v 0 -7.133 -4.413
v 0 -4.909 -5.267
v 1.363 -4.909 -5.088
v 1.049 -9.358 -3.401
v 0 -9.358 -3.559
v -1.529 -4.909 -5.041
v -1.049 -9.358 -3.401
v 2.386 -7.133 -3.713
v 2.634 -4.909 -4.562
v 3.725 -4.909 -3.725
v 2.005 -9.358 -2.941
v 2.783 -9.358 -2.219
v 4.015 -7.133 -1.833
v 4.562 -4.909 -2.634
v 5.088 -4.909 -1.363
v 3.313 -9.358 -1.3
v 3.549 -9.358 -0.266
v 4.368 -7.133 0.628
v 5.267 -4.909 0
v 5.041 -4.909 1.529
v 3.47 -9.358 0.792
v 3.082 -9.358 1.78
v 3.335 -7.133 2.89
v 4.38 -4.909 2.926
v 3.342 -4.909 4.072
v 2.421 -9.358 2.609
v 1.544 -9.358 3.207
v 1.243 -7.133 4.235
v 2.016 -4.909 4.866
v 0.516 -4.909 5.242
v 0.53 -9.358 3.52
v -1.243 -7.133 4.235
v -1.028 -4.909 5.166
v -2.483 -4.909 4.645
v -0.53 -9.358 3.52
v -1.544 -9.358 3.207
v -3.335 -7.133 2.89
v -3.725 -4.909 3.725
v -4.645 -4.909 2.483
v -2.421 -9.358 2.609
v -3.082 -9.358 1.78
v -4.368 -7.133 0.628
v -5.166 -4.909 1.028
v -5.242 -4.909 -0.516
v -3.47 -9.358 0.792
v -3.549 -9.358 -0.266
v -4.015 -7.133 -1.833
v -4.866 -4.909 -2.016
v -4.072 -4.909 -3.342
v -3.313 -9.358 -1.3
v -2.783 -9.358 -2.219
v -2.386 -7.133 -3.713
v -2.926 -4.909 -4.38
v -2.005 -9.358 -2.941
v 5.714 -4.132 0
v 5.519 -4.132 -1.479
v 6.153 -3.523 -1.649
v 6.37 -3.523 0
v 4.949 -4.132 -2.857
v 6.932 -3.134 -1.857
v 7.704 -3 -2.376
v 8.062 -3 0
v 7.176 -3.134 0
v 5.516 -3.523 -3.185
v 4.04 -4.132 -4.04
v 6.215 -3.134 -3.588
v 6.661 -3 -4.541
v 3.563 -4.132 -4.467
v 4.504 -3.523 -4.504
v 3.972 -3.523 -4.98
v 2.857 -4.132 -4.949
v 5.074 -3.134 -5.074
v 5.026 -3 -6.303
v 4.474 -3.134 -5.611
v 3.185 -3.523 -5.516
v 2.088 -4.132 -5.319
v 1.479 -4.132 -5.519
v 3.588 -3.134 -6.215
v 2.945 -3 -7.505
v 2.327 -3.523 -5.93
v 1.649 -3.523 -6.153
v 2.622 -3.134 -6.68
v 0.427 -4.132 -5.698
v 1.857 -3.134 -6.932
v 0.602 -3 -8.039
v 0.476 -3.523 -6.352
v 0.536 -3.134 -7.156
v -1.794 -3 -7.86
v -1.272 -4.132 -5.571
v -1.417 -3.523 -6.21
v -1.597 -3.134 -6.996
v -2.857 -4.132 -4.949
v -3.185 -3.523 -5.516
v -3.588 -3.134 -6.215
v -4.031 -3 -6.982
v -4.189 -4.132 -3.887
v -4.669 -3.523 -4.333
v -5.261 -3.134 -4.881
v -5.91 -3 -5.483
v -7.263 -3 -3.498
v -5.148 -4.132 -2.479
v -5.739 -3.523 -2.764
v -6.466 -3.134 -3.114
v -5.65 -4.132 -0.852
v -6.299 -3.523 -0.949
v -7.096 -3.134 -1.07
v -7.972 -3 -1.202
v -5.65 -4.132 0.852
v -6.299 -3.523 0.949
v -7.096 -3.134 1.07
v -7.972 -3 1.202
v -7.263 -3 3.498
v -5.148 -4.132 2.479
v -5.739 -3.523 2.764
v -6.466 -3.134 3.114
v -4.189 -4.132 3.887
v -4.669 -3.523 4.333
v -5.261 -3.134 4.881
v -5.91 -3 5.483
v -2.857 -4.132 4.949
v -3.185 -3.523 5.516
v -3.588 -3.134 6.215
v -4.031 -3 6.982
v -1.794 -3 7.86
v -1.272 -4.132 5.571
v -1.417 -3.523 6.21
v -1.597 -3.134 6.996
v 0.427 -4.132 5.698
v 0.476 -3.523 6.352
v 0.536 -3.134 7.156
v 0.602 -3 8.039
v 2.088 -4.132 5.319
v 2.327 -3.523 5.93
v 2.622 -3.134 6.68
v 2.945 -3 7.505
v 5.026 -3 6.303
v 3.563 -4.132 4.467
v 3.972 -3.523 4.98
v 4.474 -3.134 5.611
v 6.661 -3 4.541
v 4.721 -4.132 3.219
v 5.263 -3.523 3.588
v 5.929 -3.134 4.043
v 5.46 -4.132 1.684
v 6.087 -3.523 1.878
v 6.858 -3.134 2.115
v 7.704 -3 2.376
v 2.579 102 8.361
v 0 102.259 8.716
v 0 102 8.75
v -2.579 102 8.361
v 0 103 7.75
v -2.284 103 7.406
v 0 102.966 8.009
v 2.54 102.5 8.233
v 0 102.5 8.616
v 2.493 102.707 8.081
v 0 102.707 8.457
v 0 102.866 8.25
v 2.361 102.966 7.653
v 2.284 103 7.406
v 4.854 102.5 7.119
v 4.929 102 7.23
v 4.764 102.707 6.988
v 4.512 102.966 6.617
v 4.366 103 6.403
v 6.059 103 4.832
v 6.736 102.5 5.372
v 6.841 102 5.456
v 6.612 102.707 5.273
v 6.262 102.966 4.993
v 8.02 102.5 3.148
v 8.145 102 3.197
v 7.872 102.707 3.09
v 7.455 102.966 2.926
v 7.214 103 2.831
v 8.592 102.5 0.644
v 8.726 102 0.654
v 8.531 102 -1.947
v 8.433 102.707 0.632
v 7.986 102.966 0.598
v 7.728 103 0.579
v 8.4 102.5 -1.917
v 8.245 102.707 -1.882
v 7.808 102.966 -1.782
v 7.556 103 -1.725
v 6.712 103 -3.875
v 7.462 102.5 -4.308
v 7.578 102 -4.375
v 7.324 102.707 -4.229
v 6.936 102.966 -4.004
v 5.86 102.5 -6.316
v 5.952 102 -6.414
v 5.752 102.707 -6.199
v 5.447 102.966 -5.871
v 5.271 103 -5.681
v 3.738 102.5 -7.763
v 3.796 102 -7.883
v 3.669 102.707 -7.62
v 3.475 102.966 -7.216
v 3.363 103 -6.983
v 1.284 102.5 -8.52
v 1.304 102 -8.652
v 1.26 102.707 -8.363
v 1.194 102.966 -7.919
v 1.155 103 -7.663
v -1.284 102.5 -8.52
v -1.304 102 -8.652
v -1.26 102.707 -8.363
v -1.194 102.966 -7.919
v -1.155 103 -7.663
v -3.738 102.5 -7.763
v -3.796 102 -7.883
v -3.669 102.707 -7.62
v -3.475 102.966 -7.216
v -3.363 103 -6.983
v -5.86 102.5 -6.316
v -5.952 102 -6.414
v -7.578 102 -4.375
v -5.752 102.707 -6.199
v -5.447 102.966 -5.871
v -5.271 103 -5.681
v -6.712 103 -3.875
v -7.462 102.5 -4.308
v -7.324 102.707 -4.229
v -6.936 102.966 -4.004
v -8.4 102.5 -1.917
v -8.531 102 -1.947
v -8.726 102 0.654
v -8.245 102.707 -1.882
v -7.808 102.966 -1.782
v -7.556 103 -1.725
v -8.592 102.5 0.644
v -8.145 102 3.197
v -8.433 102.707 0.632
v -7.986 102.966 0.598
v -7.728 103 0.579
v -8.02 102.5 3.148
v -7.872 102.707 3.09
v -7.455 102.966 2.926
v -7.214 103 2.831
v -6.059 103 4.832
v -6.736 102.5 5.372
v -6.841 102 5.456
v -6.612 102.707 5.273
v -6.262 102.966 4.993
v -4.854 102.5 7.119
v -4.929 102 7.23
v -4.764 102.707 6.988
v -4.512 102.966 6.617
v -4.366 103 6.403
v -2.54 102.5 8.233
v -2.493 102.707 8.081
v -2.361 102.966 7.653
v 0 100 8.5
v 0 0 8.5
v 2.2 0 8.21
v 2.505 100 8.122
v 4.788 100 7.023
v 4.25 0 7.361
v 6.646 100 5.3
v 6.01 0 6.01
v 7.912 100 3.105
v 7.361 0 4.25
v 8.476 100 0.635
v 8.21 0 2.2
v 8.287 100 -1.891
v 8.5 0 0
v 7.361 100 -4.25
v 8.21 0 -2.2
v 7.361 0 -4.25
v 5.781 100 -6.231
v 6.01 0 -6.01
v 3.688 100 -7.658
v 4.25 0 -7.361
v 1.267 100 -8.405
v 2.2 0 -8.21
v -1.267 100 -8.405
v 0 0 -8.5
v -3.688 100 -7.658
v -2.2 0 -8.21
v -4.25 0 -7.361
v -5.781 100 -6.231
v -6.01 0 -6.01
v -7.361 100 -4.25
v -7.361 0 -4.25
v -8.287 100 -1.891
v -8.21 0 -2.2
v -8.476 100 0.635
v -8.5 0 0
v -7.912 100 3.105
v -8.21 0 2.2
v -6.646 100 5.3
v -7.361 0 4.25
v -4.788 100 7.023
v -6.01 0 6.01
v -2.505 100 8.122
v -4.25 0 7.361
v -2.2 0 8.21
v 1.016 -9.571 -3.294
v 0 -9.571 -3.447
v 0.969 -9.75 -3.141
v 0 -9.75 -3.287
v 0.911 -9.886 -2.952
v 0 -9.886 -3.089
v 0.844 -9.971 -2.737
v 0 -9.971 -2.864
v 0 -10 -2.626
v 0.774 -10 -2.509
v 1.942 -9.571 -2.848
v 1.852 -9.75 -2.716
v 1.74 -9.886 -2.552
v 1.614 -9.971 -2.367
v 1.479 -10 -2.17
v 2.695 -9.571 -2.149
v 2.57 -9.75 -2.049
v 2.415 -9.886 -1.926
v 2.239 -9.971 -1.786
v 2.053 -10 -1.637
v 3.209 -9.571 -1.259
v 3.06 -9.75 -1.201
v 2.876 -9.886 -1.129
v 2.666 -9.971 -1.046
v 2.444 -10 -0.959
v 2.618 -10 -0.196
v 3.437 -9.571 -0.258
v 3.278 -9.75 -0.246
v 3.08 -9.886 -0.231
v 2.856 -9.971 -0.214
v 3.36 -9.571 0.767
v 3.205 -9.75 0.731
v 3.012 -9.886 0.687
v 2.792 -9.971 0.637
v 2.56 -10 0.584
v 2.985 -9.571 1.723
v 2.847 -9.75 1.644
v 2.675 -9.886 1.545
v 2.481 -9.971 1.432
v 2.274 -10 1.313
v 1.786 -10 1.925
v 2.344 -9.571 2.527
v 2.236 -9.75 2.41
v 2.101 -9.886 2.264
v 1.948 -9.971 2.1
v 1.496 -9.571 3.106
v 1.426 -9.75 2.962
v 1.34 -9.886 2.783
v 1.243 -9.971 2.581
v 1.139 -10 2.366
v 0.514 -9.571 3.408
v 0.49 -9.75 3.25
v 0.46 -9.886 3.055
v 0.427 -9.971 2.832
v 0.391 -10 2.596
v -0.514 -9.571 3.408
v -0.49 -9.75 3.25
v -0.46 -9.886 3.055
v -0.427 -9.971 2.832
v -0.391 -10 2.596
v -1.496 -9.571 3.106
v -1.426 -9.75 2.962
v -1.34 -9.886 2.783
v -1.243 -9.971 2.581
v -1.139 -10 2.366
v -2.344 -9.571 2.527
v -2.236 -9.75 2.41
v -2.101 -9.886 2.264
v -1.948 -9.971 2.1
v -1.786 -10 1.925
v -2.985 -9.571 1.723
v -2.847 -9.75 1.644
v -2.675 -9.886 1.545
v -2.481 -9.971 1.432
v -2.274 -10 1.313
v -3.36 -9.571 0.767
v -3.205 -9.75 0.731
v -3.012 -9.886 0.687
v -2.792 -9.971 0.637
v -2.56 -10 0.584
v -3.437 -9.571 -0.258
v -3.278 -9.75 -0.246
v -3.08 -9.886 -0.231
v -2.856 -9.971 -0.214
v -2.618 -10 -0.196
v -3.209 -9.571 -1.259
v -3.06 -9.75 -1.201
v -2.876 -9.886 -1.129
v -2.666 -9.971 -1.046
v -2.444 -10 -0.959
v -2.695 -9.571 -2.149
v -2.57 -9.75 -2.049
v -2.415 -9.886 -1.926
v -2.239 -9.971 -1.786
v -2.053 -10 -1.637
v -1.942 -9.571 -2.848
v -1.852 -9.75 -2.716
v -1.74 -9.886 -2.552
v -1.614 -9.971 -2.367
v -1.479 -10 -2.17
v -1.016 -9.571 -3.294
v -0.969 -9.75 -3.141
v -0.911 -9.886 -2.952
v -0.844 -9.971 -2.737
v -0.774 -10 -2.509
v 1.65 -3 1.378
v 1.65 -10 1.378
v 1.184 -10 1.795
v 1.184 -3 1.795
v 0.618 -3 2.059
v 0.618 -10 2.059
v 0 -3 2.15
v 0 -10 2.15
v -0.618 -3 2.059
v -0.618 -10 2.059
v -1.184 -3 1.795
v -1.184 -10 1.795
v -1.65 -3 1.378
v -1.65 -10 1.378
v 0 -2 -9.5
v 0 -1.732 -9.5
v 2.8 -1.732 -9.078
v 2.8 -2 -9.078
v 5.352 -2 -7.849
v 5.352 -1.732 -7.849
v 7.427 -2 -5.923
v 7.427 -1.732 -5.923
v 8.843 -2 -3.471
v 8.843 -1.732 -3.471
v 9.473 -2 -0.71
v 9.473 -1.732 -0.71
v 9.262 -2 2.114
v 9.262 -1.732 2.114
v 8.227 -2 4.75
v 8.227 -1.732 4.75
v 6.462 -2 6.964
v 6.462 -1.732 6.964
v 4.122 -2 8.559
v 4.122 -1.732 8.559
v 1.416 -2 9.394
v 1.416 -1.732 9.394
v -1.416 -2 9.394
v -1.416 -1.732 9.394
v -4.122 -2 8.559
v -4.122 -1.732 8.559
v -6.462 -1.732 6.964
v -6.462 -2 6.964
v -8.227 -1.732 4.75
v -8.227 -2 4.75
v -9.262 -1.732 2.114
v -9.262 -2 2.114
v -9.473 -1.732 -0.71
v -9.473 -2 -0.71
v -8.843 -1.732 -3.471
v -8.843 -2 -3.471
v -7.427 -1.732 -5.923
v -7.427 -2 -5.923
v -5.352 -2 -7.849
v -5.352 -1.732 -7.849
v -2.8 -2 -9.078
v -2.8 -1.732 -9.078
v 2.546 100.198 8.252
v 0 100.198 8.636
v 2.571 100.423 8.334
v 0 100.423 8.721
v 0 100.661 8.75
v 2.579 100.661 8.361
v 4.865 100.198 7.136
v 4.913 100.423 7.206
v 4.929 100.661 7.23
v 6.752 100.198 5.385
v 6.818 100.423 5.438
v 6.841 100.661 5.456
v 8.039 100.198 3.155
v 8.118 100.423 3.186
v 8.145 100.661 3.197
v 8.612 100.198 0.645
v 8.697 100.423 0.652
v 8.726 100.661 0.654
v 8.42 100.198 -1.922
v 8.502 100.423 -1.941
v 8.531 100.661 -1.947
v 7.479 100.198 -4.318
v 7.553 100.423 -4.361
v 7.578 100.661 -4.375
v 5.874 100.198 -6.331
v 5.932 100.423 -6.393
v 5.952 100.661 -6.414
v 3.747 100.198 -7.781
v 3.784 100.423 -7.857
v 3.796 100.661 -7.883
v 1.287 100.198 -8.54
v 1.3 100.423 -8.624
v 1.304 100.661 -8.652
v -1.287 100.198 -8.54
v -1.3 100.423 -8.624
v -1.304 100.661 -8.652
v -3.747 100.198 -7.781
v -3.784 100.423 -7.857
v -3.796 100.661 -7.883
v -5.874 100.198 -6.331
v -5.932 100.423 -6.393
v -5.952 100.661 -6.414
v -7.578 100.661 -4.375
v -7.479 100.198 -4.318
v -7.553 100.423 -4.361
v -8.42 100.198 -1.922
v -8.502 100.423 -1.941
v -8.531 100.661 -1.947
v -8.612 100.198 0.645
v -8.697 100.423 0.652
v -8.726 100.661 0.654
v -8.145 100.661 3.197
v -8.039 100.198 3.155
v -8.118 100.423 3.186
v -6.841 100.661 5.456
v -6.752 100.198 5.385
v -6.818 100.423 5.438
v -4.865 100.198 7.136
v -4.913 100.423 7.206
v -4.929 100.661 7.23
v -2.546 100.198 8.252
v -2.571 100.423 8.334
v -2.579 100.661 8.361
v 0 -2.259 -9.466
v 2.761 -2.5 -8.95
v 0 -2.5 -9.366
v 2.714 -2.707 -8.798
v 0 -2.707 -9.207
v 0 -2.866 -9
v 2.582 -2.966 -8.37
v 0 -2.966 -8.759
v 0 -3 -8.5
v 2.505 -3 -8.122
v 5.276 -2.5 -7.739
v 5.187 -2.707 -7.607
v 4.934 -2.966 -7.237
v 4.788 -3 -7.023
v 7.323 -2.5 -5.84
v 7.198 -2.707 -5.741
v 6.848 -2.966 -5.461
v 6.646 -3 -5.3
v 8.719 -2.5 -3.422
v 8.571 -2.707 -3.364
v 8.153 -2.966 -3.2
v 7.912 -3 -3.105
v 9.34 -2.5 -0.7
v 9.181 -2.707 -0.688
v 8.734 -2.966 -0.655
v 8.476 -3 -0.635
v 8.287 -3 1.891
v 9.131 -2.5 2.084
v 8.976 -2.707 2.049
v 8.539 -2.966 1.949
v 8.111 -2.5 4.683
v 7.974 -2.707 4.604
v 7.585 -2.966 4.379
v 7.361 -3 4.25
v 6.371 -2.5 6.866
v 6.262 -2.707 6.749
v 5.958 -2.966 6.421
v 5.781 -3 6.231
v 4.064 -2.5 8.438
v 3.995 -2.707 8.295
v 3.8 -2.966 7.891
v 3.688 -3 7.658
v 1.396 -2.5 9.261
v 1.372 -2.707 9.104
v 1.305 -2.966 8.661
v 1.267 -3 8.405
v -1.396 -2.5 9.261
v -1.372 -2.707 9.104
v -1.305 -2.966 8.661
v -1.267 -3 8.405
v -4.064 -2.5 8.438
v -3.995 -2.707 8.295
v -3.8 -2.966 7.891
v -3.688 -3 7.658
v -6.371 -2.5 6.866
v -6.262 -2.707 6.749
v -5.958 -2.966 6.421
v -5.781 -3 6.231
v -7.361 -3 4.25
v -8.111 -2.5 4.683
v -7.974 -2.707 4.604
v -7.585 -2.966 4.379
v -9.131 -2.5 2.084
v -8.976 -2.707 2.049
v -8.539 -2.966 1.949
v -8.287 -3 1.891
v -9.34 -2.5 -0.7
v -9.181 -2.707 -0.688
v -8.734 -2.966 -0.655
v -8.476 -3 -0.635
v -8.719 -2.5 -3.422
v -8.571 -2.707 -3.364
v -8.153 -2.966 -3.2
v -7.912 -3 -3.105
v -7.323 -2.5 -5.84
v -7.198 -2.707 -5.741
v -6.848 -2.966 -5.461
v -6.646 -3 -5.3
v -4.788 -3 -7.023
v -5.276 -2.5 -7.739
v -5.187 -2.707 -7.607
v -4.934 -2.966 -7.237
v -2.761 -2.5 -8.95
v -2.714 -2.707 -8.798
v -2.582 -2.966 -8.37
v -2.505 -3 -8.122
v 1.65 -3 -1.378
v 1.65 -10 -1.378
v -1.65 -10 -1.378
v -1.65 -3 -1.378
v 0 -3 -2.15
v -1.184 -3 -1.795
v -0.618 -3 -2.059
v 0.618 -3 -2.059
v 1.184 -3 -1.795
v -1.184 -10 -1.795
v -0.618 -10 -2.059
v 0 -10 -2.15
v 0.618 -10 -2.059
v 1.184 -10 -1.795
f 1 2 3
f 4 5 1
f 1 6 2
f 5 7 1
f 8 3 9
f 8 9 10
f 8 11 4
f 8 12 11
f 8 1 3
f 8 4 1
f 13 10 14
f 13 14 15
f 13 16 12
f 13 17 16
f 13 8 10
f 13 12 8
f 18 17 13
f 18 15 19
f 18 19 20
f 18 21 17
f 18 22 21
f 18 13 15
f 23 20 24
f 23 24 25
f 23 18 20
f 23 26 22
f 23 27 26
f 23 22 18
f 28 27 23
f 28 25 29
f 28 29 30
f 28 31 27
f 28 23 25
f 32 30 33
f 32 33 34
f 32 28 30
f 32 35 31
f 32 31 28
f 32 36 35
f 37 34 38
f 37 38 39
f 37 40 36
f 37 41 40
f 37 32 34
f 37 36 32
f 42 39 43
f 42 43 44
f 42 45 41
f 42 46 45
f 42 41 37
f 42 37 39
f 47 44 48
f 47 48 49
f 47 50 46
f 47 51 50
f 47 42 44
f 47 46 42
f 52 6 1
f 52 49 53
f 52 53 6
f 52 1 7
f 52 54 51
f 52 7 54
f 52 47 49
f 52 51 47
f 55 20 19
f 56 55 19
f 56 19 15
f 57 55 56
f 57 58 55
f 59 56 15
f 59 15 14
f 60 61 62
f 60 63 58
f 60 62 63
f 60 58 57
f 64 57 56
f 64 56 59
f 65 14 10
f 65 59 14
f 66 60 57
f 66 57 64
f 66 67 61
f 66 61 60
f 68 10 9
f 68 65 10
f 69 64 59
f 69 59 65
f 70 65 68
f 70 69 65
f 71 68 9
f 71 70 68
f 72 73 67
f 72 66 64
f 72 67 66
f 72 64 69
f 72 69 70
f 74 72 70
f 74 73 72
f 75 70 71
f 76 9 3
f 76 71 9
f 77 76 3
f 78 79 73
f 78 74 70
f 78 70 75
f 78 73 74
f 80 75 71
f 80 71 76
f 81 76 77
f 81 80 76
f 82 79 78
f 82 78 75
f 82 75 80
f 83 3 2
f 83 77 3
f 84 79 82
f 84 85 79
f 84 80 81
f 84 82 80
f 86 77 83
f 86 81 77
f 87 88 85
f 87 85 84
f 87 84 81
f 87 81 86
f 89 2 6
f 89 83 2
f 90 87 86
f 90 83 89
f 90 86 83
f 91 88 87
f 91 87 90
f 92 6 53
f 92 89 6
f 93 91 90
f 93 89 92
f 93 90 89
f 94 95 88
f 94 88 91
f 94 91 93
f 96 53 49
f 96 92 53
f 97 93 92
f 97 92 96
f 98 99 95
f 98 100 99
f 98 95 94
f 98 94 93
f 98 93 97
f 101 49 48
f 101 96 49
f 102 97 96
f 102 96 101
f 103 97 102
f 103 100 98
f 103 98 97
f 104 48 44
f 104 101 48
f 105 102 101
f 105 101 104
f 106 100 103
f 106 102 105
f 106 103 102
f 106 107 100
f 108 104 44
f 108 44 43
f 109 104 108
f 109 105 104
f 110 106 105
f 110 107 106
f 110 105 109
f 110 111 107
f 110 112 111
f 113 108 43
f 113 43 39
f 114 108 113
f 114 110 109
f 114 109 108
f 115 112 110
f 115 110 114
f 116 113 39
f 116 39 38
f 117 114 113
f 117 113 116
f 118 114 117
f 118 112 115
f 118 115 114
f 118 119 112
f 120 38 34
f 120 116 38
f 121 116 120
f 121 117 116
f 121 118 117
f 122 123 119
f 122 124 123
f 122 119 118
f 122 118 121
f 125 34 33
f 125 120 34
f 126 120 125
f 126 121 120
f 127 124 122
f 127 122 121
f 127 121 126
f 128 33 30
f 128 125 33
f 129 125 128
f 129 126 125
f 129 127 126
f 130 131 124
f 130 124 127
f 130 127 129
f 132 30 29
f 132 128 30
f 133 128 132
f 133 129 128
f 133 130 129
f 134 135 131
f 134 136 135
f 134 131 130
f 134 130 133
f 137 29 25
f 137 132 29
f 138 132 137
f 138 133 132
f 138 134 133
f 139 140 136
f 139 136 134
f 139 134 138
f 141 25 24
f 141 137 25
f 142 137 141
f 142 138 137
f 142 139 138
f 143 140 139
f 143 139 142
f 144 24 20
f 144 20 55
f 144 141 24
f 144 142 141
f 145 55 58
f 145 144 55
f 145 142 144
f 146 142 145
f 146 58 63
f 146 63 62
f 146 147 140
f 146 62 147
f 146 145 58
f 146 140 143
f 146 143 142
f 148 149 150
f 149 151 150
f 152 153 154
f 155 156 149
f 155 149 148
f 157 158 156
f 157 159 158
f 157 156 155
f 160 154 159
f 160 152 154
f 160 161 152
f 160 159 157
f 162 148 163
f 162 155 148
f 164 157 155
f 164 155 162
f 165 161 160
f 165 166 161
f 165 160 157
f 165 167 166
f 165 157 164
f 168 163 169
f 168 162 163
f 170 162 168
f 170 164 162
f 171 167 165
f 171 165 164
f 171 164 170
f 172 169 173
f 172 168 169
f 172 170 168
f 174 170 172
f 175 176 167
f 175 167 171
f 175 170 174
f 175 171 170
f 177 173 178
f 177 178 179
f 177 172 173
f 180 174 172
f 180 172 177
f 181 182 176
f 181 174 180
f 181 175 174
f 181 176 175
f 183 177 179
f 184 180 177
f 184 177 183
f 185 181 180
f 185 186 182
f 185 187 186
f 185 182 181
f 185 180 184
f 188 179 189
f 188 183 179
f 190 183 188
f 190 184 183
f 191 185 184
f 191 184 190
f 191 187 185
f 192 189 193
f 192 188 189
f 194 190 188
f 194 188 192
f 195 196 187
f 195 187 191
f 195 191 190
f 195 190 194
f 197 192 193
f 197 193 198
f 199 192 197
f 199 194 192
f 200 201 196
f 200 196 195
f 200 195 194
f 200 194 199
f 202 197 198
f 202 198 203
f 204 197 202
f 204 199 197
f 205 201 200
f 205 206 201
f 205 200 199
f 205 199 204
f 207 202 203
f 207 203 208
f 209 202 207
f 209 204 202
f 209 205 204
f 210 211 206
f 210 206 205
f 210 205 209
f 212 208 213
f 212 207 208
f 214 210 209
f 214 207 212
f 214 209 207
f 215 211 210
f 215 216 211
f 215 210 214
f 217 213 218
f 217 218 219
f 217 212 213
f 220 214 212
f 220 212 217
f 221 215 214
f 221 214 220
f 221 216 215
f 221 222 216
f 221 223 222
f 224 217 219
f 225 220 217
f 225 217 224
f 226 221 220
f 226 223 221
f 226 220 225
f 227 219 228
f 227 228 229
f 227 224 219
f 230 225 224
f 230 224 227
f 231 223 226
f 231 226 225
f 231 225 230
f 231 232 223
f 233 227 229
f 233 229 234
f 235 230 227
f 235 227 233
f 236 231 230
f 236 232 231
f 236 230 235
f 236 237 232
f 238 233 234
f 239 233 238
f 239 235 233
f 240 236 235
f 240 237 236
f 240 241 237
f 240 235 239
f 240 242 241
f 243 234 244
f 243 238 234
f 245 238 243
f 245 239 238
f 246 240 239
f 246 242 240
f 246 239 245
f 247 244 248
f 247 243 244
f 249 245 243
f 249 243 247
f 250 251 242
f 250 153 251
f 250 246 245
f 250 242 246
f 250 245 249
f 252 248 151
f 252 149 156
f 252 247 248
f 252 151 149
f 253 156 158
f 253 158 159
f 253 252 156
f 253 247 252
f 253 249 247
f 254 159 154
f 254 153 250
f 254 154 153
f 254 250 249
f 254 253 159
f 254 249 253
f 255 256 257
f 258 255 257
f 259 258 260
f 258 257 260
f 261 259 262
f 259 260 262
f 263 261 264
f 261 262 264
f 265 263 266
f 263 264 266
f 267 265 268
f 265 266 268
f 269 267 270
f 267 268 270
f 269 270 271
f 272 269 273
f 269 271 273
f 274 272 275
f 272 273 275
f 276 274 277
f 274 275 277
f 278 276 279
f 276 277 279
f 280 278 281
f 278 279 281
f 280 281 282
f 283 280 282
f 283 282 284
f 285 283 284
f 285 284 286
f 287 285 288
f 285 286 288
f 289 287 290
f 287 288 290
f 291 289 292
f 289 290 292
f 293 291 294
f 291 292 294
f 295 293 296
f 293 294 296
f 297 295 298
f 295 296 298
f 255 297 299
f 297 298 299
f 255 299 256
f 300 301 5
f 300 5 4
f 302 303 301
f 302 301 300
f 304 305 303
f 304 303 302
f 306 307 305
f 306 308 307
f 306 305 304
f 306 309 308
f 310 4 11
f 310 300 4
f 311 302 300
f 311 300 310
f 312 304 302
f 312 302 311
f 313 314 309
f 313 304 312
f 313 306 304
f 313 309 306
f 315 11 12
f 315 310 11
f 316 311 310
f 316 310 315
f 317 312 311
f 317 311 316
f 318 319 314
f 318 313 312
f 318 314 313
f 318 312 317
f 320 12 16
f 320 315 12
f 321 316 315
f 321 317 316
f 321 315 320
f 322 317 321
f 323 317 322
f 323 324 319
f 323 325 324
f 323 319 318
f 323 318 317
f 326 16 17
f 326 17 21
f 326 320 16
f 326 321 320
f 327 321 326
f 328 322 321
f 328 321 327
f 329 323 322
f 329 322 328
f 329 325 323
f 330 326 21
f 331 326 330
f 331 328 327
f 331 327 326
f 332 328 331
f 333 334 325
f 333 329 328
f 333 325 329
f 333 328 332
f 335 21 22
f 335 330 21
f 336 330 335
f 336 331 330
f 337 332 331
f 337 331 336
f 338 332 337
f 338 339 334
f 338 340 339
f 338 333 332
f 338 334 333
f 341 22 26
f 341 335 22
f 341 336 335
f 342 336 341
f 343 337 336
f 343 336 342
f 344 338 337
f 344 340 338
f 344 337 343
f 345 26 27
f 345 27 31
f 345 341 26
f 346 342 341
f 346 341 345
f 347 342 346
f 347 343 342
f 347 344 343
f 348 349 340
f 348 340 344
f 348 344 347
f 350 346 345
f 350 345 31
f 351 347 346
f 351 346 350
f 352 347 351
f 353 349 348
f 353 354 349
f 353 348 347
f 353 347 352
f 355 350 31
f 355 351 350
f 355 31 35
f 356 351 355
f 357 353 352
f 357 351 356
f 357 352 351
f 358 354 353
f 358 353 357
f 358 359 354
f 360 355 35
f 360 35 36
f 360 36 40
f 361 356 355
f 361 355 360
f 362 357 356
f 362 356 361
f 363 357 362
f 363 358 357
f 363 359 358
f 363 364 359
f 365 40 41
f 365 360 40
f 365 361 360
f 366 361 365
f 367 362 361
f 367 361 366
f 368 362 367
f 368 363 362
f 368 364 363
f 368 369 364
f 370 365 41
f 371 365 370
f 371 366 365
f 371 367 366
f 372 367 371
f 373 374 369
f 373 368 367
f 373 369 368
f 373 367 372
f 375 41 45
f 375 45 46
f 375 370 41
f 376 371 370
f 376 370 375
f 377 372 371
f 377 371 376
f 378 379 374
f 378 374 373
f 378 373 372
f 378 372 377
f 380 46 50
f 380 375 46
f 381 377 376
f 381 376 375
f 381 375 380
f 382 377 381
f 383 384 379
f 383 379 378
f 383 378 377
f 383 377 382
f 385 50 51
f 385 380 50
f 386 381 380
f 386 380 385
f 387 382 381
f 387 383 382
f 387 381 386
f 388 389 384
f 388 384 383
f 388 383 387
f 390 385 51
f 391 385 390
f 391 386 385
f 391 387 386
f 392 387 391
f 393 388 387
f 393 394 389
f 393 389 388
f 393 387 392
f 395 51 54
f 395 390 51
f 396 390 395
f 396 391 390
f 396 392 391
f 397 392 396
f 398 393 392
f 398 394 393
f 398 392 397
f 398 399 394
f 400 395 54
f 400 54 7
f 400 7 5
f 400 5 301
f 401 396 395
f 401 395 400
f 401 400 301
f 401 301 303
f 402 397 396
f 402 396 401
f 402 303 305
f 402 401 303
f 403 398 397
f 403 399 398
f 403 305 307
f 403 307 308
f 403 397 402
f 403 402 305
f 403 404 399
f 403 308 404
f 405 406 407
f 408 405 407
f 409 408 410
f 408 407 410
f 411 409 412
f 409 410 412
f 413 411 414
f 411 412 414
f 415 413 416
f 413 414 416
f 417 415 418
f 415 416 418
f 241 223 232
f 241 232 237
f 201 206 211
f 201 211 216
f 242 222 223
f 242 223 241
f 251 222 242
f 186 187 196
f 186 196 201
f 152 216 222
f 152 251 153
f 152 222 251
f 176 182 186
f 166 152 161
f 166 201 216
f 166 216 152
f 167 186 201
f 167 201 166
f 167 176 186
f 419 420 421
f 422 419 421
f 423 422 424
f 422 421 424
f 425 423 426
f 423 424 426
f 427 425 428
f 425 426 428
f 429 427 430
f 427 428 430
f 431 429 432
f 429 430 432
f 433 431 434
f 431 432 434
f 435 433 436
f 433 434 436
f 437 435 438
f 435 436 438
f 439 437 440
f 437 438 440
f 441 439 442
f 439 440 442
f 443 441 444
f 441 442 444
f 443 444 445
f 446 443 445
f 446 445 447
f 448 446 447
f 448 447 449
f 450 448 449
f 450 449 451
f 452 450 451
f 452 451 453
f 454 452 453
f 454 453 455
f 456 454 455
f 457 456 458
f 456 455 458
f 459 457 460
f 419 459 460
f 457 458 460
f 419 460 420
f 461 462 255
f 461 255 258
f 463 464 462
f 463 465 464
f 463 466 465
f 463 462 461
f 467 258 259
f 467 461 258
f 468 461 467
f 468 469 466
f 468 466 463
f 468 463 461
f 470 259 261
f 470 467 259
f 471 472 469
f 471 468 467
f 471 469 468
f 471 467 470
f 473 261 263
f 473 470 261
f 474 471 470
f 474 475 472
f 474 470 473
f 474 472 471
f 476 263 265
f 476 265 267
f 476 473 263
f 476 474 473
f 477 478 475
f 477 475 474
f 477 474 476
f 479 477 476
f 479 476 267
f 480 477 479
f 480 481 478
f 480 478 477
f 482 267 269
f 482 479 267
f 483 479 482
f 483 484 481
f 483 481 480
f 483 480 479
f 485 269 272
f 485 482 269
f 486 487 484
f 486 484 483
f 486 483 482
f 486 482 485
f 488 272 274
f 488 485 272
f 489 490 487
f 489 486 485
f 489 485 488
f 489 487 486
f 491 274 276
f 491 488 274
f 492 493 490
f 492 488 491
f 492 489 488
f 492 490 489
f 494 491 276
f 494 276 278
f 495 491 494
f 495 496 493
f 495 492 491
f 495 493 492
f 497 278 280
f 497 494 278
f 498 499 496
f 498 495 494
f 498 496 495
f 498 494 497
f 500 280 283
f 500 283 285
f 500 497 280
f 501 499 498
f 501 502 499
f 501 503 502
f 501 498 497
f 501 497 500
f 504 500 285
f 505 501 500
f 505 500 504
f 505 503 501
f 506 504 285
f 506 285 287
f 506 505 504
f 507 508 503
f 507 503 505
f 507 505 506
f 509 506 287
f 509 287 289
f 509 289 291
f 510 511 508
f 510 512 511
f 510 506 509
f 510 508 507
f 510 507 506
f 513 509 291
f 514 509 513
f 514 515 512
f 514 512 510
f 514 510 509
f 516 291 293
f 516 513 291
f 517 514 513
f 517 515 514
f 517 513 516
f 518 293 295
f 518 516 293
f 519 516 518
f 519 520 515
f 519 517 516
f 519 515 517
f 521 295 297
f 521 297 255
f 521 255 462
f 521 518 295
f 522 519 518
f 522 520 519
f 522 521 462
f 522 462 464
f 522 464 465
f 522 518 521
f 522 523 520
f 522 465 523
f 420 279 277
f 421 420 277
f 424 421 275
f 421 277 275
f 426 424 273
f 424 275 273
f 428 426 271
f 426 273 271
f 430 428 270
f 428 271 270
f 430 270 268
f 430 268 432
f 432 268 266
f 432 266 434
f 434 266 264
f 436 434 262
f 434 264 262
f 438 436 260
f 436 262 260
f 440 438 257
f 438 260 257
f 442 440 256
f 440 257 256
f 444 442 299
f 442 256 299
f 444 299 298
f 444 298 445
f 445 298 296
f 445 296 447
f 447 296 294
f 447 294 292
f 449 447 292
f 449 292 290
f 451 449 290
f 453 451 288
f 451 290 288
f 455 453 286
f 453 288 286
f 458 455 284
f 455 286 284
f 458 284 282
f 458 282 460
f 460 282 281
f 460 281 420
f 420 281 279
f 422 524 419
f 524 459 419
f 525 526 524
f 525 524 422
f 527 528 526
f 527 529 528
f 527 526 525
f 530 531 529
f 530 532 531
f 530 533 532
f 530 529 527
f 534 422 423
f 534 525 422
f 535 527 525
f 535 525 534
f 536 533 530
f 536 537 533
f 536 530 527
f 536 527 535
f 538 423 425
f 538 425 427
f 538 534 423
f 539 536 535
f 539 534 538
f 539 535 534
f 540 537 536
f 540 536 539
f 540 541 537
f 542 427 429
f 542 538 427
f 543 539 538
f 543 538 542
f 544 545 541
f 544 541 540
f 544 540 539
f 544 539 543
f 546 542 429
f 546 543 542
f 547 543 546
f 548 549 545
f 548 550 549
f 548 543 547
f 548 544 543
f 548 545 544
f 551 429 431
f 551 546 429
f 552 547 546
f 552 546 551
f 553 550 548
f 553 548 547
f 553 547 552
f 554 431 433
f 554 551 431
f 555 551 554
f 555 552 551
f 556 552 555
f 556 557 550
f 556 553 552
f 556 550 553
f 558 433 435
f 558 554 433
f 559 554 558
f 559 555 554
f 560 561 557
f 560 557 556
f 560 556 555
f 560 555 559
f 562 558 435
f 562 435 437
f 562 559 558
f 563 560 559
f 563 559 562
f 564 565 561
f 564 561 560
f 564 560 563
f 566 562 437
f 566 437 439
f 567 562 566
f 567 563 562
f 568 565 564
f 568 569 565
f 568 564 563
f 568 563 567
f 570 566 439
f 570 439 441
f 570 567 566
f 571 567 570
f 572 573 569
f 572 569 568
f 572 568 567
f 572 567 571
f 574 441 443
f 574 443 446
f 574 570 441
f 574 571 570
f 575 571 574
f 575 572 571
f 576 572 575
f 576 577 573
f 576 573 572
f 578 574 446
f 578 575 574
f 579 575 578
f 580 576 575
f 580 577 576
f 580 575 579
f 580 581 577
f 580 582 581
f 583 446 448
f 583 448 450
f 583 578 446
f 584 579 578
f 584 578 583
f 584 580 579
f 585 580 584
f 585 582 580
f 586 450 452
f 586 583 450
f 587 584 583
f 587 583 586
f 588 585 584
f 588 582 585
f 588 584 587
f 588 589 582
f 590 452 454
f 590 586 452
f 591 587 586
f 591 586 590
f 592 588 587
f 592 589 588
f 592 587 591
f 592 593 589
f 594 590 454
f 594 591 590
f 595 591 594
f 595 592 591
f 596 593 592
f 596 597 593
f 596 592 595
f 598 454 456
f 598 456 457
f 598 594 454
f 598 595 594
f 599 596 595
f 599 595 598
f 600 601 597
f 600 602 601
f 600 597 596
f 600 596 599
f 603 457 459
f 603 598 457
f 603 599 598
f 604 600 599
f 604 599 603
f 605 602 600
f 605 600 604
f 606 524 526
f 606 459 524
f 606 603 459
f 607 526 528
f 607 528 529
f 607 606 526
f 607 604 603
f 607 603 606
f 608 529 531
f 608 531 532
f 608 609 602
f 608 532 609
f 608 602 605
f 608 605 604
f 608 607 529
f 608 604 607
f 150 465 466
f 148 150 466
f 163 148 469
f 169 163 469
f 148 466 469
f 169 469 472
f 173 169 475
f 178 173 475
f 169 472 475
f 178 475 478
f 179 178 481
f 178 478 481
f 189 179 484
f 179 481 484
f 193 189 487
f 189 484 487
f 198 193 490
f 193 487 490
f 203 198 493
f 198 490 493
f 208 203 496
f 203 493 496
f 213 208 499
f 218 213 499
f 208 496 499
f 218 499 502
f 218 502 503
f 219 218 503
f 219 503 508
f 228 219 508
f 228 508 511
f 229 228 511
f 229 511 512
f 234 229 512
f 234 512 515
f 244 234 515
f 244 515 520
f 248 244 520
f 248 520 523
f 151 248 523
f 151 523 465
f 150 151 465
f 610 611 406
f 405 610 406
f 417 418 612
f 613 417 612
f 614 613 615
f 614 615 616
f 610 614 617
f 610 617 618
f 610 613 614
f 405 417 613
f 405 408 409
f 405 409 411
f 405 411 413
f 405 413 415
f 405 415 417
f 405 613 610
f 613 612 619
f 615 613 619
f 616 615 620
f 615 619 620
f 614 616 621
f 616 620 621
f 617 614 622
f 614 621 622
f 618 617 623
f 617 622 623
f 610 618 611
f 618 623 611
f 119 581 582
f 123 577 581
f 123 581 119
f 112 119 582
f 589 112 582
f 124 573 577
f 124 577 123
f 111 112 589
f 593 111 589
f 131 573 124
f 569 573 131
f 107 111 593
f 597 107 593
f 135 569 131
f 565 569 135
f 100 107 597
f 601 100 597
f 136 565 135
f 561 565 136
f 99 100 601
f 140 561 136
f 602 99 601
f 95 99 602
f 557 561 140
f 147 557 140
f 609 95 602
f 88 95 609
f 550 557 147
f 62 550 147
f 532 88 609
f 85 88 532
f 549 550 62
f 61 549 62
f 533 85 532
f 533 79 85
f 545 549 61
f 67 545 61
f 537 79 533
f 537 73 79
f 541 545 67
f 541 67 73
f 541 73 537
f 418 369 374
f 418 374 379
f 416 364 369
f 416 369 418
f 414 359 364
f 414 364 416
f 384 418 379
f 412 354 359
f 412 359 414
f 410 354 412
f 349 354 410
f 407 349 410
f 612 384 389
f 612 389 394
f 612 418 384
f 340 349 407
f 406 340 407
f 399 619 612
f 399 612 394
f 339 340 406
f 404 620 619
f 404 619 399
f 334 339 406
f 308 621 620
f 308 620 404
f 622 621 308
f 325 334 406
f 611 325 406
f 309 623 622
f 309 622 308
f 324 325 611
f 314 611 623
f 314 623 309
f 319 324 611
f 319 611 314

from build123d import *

# Parameters (mm, degrees)
SKETCH1_R           = 8.5
BOSS_EXTRUDE1_DEPTH = 100
SKETCH2_R           = 8.75
BOSS_EXTRUDE2_DEPTH = 3
FILLET5_R           = 1
FILLET8_R           = 1
SKETCH5_R           = 9.5
BOSS_EXTRUDE3_DEPTH = 3
FILLET10_R          = 1
CHAMFER2_SIZE2      = 1
CHAMFER2_SIZE       = 1.732050808
SKETCH6_R           = 6
BOSS_EXTRUDE4_DEPTH = 7
CUT_EXTRUDE1_DEPTH  = 7
CHAMFER4_SIZE2      = 2.687048245
CHAMFER4_SIZE       = 7
FILLET12_R          = 1


with BuildPart() as part:
    # Sketch1 → Boss-Extrude1 (new body)
    with BuildSketch(Plane(origin=(0, 0, 0), x_dir=(1, 0, 0), z_dir=(0, 1, 0))):
        with Locations(Location((0, 0, 0), (0, 0, 270))):
            Circle(SKETCH1_R)
    extrude(amount=BOSS_EXTRUDE1_DEPTH)

    # Sketch2 → Boss-Extrude2 (add)
    with BuildSketch(Plane(origin=(0, 100, 0), x_dir=(1, 0, 0), z_dir=(0, 1, 0))):
        with Locations(Location((0, 0, 0), (0, 0, 270))):
            Circle(SKETCH2_R)
    extrude(amount=BOSS_EXTRUDE2_DEPTH)

    # Fillet5
    fillet5_edges = [part.edges().sort_by_distance(p)[0] for p in [
        (0, 103, -8.75),
    ]]
    fillet(fillet5_edges, radius=FILLET5_R)

    # Fillet8
    # the kernel refuses this fillet: 1 mm, written as the material it takes off along each edge
    with BuildSketch(Plane(origin=(0, 100, 0), x_dir=(0, 0, 1), z_dir=(-1, 0, 0))) as fillet8_piece_1:
        with BuildLine():
            CenterArc((7.75, 0.661437828), FILLET8_R, 318.590377891, 41.409622109)
            Line((8.5, 0), (8.515, -0.013228757))
            ThreePointArc((8.515, -0.013228757), (8.625, -0.02), (8.75, -0.02))
            Line((8.75, -0.02), (8.77, 0))
            Line((8.77, 0), (8.77, 0.661437828))
            Line((8.77, 0.661437828), (8.75, 0.661437828))
        make_face()
    revolve(axis=Axis((0, 100, 0), (0, 1, 0)), mode=Mode.SUBTRACT)

    # Sketch5 → Boss-Extrude3 (add)
    with BuildSketch(Plane.XZ):
        with Locations(Location((0, 0, 0), (0, 0, 270))):
            Circle(SKETCH5_R)
    extrude(amount=BOSS_EXTRUDE3_DEPTH)

    # Fillet10
    fillet10_edges = [part.edges().sort_by_distance(p)[0] for p in [
        (0, -3, 9.5),
    ]]
    fillet(fillet10_edges, radius=FILLET10_R)

    # Chamfer2
    chamfer2_edges = [part.edges().sort_by_distance(p)[0] for p in [
        (0, 0, 9.5),
    ]]
    chamfer2_side = [part.faces().sort_by_distance(p)[0] for p in [
        (0, -0.02, 9.5),
    ]]
    chamfer(chamfer2_edges, length=CHAMFER2_SIZE - 0.0001, length2=CHAMFER2_SIZE2 - 0.0001, reference=chamfer2_side[0])  # a hair under: the kernel refuses the full size

    # Sketch6 → Boss-Extrude4 (add)
    with BuildSketch(Plane.XZ.offset(3)):
        with Locations(Location((0, 0, 0), (0, 0, 270))):
            Circle(SKETCH6_R)
    extrude(amount=BOSS_EXTRUDE4_DEPTH)

    # Sketch7 → Cut-Extrude1 (cut)
    with BuildSketch(Plane.XZ.offset(10)):
        with BuildLine():
            Line((-1.65, 1.378404875), (-1.65, -1.378404875))
            ThreePointArc((-1.65, -1.378404875), (0, -2.15), (1.65, -1.378404875))
            Line((1.65, -1.378404875), (1.65, 1.378404875))
            ThreePointArc((1.65, 1.378404875), (0, 2.15), (-1.65, 1.378404875))
        make_face()
    extrude(amount=-CUT_EXTRUDE1_DEPTH, mode=Mode.SUBTRACT)

    # Chamfer4
    chamfer4_edges = [part.edges().sort_by_distance(p)[0] for p in [
        (0, -10, 6),
    ]]
    chamfer4_side = [part.faces().sort_by_distance(p)[0] for p in [
        (0, -9.946259035, 6),
    ]]
    chamfer(chamfer4_edges, length=CHAMFER4_SIZE - 0.0001, length2=CHAMFER4_SIZE2 - 0.0001, reference=chamfer4_side[0])  # a hair under: the kernel refuses the full size

    # Fillet11: read off the stored shape, not the designer's step
    # Fillet11 outline → Fillet11 (revolve)
    with BuildSketch(Plane.XY):
        with BuildLine():
            Line((5.261101596, -3), (5.261101596, -4.924896151))
            ThreePointArc((5.261101596, -4.924896151), (6.362624165, -3.527621434), (8.061842876, -3))
            Line((8.061842876, -3), (5.261101596, -3))
        make_face()
    revolve(axis=Axis((0, 0, 0), (0, 1, 0)))

    # Fillet12
    fillet12_edges = [part.edges().sort_by_distance(p)[0] for p in [
        (0, -10, 3.313051755),
    ]]
    fillet(fillet12_edges, radius=FILLET12_R)


solid = part.part
